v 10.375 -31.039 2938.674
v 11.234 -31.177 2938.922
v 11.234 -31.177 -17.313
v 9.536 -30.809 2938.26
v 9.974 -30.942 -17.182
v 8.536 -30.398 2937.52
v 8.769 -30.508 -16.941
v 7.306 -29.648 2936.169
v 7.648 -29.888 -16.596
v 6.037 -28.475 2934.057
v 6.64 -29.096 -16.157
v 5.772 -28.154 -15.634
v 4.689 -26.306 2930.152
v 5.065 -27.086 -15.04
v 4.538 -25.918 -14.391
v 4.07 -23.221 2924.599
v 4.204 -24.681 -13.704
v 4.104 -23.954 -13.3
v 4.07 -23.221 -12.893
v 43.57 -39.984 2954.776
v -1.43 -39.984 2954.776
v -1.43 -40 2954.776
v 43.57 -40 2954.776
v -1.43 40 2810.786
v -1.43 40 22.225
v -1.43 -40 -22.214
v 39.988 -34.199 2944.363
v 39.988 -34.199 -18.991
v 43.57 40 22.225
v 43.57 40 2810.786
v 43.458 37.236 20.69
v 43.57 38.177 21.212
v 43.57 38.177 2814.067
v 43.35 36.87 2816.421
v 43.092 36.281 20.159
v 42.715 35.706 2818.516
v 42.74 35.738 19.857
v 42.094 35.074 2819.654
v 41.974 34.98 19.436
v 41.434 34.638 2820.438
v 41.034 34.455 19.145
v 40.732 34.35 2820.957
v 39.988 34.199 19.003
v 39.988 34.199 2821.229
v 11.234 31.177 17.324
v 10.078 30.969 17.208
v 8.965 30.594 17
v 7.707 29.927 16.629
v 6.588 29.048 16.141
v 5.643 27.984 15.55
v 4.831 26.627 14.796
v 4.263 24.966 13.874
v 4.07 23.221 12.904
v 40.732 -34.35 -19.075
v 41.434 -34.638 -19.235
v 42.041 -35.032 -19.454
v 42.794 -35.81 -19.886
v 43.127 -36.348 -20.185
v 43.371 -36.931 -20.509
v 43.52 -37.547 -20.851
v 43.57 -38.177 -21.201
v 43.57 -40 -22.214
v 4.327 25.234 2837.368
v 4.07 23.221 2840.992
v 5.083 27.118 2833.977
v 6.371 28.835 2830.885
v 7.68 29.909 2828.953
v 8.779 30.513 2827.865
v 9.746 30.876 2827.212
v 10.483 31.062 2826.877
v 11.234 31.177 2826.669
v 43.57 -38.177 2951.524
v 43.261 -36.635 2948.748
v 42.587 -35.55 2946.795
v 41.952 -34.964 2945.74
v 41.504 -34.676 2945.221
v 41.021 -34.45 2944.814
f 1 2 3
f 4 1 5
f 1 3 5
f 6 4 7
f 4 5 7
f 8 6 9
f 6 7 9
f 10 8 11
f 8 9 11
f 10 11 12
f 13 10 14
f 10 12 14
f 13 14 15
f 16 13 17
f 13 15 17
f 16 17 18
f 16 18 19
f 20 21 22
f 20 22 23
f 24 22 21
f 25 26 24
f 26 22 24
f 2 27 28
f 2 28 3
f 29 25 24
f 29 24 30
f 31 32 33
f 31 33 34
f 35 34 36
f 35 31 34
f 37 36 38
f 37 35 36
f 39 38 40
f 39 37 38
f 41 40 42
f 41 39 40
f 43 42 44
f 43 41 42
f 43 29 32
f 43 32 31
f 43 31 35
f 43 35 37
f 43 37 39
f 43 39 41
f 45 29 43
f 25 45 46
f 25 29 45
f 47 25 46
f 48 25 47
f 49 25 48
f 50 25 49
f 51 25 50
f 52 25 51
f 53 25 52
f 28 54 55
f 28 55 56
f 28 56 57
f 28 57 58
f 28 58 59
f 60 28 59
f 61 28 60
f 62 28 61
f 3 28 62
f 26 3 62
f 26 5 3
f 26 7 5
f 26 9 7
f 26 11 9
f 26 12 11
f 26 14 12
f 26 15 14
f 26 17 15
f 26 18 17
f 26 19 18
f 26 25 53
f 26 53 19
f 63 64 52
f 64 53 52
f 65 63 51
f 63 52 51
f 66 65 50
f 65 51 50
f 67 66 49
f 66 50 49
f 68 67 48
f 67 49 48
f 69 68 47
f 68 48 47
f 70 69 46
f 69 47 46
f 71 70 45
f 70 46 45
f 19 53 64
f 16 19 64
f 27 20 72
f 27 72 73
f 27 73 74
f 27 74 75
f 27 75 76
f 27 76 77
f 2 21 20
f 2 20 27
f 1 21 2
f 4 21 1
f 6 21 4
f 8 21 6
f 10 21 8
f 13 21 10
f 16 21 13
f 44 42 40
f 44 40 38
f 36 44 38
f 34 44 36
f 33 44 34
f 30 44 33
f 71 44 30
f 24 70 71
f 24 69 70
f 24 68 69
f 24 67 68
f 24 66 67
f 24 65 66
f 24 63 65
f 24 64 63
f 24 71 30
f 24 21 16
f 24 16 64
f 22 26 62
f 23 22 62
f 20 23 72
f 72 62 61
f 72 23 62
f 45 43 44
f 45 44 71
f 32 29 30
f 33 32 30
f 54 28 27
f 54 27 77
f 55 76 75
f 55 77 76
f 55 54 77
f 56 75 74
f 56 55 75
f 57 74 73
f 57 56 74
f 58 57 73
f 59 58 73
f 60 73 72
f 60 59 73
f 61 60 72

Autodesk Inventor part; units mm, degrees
ref_plane "Начальная плоскость" through (0, 0, -22.2222) normal (0, 0, 1) x (1, 0, 0)
ref_plane "Конечная плоскость" through (0, 0, 2954.7764) normal (0, 0, 1) x (1, 0, 0)
sketch "Эскиз" plane through (0, 0, 0) normal (0, 0, 1) x (1, 0, 0)
  line L0 (-1.43, 0) -> (-1.43, 40)
  line L1 (-1.43, 40) -> (43.57, 40)
  line L2 (43.57, 40) -> (43.57, 38.1774)
  line L3 (39.9881, 34.1993) -> (11.2338, 31.1771)
  line L4 (4.07, 23.221) -> (4.07, 0)
  line L5 (4.07, 0) -> (-1.43, 0) construction
  line L6 (23.82, 40) -> (23.82, 32.5) construction
  line L7 (43.57, 34.5758) -> (43.57, 32.5) construction
  line L8 (43.57, 32.5) -> (23.82, 32.5) construction
  line L9 (0, 15) -> (0, -27) construction
  line L10 (-5.539, 0) -> (16.0067, 0) construction
  line L11 (-1.43, 0) -> (-1.43, -40)
  line L12 (-1.43, -40) -> (43.57, -40)
  line L13 (43.57, -40) -> (43.57, -38.1774)
  line L14 (39.9881, -34.1993) -> (11.2338, -31.1771)
  line L15 (4.07, -23.221) -> (4.07, 0)
  arc A0 (11.2338, 31.1771) -> (4.07, 23.221) centre (12.07, 23.221) ccw
  arc A1 (4.07, -23.221) -> (11.2338, -31.1771) centre (12.07, -23.221) ccw
  arc A2 (39.9881, 34.1993) -> (43.57, 38.1774) centre (39.57, 38.1774) ccw
  arc A3 (43.57, -38.1774) -> (39.9881, -34.1993) centre (39.57, -38.1774) ccw
  line L16 (0, 56) -> (0, -56) construction
  line L17 (-15.5135, 0) -> (54.308, 0) construction
  point P0 (4.07, 30.4242)
  point P1 (43.57, -34.5758)
  point P2 (4.07, -30.4242)
  point P3 (23.82, -40)
  point P4 (23.82, -32.5)
  dimension "d0" = 5.5
  dimension "d1" = 40
  dimension "d2" = 45
  dimension "d3" = 7.5
  dimension "d4" = 19.75
  dimension "d5" = 2.0758
  dimension "d23" = 8
  dimension "d24" = 4
  dimension "d25" = 1.43
extrude "Тело" add sketch "Эскиз" along normal up to surface (2976.9987 mm away) from surface at -22.2222
sketch "Sketch3" plane through (0, 0, 0) normal (0, 0, 1) x (1, 0, 0)
  line L0 (0, 0) -> (10, 0)
ref_plane "Work Plane3" through (0, 0, 0) normal (0, -1, 0) x (1, 0, 0)
sketch "Sketch4" plane through (0, 0, 0) normal (0, -1, 0) x (1, 0, 0)
  line L0 (-2, -22.2222) -> (12, -22.2222)
  line L1 (-2, 2954.7764) -> (12, 2954.7764)
  dimension "d29" = 2976.9987
ref_plane "РабПлоскость4" through (91.07, 77.7029, 2742.9113) normal (0, 0.8742, 0.4856) x (1, 0, 0)
split "Разделение1" plane through (91.07, 77.7029, 2742.9113) removes the side toward (0, 0.8742, 0.4856)
ref_plane "РабПлоскость5" through (91.07, 74.3034, 41.2796) normal (0, 0.4856, -0.8742) x (1, 0, 0)
split "Разделение2" plane through (91.07, 74.3034, 41.2796) removes the side toward (0, 0.4856, -0.8742)
equation "\"d0\" = G_T"
equation "\"d1\" = 0.5 * G_H"
equation "\"d2\" = G_W"
equation "\"d3\" = G_T1"
equation "\"d4\" = G_C"
equation "\"d23\" = G_IR"
equation "\"d24\" = G_ER"
equation "\"d25\" = ex"
equation "\"d6\" = G_L"
equation "\"G_W\" = 45"
equation "\"G_T\" = 5.5"
equation "\"G_T1\" = 7.5"
equation "\"G_NG\" = 0.105104"
equation "\"G_ER\" = 4"
equation "\"G_IR\" = 8"
equation "\"G_C\" = 19.75"
equation "\"G_L\" = d29"
equation "\"ex\" = 1.43"
equation "\"G_OFFSET_START\" = 22.22222"
equation "\"G_OFFSET_END\" = 72"
equation "\"d26\" = -G_OFFSET_START"
equation "\"d27\" = G_OFFSET_END + B_L"
equation "\"B_L\" = 2882.77644"
equation "\"G_H\" = 80"
properties part number "ISO 657/11 - CH 80 x 8 - 2977" material "Сталь, мягкая"
